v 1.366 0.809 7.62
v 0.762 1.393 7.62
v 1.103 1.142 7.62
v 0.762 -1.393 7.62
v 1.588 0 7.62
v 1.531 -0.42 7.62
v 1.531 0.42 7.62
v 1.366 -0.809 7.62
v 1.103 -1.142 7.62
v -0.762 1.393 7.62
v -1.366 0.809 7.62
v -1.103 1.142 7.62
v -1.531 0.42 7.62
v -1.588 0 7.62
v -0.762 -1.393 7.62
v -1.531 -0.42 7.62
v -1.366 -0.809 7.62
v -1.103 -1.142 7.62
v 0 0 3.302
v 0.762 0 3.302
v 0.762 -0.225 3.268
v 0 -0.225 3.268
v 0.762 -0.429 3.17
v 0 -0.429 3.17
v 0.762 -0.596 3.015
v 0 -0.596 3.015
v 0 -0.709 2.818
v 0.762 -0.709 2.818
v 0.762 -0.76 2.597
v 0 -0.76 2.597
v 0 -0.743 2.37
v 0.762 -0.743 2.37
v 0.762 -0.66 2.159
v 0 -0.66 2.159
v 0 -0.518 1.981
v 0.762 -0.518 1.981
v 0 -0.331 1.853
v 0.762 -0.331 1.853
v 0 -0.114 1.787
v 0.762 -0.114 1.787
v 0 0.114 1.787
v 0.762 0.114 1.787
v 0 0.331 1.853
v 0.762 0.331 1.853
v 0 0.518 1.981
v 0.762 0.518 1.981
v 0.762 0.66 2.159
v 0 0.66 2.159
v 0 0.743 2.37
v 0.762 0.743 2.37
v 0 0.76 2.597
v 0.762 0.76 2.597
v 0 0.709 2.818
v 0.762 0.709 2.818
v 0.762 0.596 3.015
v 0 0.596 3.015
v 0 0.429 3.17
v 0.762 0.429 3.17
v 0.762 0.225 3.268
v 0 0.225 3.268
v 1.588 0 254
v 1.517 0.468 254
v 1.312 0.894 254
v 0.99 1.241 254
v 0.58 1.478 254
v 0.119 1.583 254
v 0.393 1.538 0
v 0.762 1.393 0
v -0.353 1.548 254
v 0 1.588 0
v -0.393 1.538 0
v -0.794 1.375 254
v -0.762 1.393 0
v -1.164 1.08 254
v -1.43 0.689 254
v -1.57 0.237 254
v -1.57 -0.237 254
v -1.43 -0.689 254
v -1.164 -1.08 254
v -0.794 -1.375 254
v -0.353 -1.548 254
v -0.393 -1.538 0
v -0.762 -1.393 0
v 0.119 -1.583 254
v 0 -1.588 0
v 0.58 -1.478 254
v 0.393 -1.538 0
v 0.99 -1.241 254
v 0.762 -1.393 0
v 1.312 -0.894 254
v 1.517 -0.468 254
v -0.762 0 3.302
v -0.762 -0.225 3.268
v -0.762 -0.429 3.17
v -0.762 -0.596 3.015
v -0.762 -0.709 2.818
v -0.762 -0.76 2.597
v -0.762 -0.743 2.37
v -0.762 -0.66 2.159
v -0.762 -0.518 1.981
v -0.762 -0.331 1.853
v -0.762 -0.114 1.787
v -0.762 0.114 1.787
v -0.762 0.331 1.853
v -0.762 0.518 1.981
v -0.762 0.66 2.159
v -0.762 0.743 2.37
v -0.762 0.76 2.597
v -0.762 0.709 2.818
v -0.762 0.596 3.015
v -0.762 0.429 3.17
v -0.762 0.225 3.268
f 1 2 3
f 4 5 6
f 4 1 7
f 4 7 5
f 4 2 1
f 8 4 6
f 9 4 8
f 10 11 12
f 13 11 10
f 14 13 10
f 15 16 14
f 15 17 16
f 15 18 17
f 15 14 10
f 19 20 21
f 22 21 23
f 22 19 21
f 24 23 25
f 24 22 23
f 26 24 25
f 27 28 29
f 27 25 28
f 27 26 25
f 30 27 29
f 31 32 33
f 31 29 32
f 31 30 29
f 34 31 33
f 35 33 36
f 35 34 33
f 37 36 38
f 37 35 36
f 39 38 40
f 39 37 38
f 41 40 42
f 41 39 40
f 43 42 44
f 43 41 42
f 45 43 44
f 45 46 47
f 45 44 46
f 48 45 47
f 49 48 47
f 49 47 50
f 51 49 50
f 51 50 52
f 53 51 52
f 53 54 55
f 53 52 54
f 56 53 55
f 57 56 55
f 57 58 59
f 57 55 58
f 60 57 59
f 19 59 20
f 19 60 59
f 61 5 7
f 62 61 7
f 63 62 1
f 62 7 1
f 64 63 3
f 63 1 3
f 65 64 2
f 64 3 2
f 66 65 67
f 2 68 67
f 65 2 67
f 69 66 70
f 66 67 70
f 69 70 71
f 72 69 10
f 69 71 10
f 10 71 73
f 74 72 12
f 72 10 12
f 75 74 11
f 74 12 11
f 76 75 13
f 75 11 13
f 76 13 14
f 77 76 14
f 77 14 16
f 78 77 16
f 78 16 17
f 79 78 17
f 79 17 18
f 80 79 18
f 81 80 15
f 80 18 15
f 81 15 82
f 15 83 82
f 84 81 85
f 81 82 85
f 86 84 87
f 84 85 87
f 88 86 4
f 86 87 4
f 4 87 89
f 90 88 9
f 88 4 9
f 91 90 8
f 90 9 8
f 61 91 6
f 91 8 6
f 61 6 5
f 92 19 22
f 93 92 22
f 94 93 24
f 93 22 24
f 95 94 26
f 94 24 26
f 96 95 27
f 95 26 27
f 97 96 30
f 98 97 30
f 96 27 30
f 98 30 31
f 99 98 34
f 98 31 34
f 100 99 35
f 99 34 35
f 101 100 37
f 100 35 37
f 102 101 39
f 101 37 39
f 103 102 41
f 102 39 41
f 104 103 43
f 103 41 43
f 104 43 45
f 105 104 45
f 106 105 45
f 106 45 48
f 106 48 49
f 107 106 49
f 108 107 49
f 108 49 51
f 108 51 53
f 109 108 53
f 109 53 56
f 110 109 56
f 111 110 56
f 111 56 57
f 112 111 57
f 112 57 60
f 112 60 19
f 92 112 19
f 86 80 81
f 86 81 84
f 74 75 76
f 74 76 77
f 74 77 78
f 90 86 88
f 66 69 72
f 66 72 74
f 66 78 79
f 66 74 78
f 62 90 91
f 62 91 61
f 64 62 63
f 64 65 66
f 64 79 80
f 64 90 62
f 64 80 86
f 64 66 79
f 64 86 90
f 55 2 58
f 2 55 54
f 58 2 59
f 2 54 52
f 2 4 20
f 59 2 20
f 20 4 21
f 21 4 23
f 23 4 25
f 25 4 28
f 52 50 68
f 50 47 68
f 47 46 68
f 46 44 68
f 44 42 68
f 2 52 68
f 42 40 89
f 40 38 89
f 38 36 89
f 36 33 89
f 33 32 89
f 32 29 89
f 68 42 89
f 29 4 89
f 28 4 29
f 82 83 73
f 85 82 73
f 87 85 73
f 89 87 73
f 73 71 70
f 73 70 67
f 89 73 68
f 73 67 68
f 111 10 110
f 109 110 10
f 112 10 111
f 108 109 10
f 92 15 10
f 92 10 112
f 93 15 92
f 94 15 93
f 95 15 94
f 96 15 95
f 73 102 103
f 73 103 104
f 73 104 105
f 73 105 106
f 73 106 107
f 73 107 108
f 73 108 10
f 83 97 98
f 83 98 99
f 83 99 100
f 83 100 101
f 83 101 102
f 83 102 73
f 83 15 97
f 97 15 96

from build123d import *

# Parameters (mm, degrees)
SKETCH1_R                      = 1.5875
BOSS_EXTRUDE1_DEPTH            = 254
CUT_EXTRUDE1_DEPTH             = 255.009921681
CUT_EXTRUDE1_DEPTH_BACK        = 255.009921681
SKETCH2_W                      = 0.8255
SKETCH2_H                      = 7.62
CUT_EXTRUDE2_REACH             = 256.01
SKETCH3_R                      = 0.762
CUT_EXTRUDE2_DIRECTION_2_REACH = 256.01


with BuildPart() as part:
    # Sketch1 → Boss-Extrude1 (new body)
    with BuildSketch(Plane.XY):
        Circle(SKETCH1_R)
    extrude(amount=BOSS_EXTRUDE1_DEPTH)

    # Sketch2 → Cut-Extrude1 (cut, two sides: drawn at the far end of the back side and taken through both)
    with BuildSketch(Plane(origin=(0, 0, 0), x_dir=(1, 0, 0), z_dir=(0, 1, 0)).offset(-CUT_EXTRUDE1_DEPTH_BACK)):
        with Locations((1.17475, -3.81)):
            Rectangle(SKETCH2_W, SKETCH2_H)
        with Locations((-1.17475, -3.81)):
            Rectangle(SKETCH2_W, SKETCH2_H)
    extrude(amount=CUT_EXTRUDE1_DEPTH + CUT_EXTRUDE1_DEPTH_BACK, mode=Mode.SUBTRACT)

    # Sketch3 → Cut-Extrude2 (cut, up to next)
    with BuildSketch(Plane(origin=(0, 0, 0), x_dir=(0, 0, -1), z_dir=(1, 0, 0)), mode=Mode.PRIVATE) as cut_extrude2_sk1:
        with Locations(Location((-2.54, 0, 0), (0, 0, 180))):
            Circle(SKETCH3_R)
    cut_extrude2_tool1 = extrude(cut_extrude2_sk1.sketch, amount=-CUT_EXTRUDE2_REACH, mode=Mode.PRIVATE) & part.part
    add(cut_extrude2_tool1.solids().sort_by_distance((0, 0, 2.54))[0], mode=Mode.SUBTRACT)

    # Sketch3 → Cut-Extrude2 direction 2 (cut, up to next)
    with BuildSketch(Plane(origin=(0, 0, 0), x_dir=(0, 0, -1), z_dir=(1, 0, 0)), mode=Mode.PRIVATE) as cut_extrude2_direction_2_sk1:
        with Locations(Location((-2.54, 0, 0), (0, 0, 180))):
            Circle(SKETCH3_R)
    cut_extrude2_direction_2_tool1 = extrude(cut_extrude2_direction_2_sk1.sketch, amount=CUT_EXTRUDE2_DIRECTION_2_REACH, mode=Mode.PRIVATE) & part.part
    add(cut_extrude2_direction_2_tool1.solids().sort_by_distance((0, 0, 2.54))[0], mode=Mode.SUBTRACT)


solid = part.part
